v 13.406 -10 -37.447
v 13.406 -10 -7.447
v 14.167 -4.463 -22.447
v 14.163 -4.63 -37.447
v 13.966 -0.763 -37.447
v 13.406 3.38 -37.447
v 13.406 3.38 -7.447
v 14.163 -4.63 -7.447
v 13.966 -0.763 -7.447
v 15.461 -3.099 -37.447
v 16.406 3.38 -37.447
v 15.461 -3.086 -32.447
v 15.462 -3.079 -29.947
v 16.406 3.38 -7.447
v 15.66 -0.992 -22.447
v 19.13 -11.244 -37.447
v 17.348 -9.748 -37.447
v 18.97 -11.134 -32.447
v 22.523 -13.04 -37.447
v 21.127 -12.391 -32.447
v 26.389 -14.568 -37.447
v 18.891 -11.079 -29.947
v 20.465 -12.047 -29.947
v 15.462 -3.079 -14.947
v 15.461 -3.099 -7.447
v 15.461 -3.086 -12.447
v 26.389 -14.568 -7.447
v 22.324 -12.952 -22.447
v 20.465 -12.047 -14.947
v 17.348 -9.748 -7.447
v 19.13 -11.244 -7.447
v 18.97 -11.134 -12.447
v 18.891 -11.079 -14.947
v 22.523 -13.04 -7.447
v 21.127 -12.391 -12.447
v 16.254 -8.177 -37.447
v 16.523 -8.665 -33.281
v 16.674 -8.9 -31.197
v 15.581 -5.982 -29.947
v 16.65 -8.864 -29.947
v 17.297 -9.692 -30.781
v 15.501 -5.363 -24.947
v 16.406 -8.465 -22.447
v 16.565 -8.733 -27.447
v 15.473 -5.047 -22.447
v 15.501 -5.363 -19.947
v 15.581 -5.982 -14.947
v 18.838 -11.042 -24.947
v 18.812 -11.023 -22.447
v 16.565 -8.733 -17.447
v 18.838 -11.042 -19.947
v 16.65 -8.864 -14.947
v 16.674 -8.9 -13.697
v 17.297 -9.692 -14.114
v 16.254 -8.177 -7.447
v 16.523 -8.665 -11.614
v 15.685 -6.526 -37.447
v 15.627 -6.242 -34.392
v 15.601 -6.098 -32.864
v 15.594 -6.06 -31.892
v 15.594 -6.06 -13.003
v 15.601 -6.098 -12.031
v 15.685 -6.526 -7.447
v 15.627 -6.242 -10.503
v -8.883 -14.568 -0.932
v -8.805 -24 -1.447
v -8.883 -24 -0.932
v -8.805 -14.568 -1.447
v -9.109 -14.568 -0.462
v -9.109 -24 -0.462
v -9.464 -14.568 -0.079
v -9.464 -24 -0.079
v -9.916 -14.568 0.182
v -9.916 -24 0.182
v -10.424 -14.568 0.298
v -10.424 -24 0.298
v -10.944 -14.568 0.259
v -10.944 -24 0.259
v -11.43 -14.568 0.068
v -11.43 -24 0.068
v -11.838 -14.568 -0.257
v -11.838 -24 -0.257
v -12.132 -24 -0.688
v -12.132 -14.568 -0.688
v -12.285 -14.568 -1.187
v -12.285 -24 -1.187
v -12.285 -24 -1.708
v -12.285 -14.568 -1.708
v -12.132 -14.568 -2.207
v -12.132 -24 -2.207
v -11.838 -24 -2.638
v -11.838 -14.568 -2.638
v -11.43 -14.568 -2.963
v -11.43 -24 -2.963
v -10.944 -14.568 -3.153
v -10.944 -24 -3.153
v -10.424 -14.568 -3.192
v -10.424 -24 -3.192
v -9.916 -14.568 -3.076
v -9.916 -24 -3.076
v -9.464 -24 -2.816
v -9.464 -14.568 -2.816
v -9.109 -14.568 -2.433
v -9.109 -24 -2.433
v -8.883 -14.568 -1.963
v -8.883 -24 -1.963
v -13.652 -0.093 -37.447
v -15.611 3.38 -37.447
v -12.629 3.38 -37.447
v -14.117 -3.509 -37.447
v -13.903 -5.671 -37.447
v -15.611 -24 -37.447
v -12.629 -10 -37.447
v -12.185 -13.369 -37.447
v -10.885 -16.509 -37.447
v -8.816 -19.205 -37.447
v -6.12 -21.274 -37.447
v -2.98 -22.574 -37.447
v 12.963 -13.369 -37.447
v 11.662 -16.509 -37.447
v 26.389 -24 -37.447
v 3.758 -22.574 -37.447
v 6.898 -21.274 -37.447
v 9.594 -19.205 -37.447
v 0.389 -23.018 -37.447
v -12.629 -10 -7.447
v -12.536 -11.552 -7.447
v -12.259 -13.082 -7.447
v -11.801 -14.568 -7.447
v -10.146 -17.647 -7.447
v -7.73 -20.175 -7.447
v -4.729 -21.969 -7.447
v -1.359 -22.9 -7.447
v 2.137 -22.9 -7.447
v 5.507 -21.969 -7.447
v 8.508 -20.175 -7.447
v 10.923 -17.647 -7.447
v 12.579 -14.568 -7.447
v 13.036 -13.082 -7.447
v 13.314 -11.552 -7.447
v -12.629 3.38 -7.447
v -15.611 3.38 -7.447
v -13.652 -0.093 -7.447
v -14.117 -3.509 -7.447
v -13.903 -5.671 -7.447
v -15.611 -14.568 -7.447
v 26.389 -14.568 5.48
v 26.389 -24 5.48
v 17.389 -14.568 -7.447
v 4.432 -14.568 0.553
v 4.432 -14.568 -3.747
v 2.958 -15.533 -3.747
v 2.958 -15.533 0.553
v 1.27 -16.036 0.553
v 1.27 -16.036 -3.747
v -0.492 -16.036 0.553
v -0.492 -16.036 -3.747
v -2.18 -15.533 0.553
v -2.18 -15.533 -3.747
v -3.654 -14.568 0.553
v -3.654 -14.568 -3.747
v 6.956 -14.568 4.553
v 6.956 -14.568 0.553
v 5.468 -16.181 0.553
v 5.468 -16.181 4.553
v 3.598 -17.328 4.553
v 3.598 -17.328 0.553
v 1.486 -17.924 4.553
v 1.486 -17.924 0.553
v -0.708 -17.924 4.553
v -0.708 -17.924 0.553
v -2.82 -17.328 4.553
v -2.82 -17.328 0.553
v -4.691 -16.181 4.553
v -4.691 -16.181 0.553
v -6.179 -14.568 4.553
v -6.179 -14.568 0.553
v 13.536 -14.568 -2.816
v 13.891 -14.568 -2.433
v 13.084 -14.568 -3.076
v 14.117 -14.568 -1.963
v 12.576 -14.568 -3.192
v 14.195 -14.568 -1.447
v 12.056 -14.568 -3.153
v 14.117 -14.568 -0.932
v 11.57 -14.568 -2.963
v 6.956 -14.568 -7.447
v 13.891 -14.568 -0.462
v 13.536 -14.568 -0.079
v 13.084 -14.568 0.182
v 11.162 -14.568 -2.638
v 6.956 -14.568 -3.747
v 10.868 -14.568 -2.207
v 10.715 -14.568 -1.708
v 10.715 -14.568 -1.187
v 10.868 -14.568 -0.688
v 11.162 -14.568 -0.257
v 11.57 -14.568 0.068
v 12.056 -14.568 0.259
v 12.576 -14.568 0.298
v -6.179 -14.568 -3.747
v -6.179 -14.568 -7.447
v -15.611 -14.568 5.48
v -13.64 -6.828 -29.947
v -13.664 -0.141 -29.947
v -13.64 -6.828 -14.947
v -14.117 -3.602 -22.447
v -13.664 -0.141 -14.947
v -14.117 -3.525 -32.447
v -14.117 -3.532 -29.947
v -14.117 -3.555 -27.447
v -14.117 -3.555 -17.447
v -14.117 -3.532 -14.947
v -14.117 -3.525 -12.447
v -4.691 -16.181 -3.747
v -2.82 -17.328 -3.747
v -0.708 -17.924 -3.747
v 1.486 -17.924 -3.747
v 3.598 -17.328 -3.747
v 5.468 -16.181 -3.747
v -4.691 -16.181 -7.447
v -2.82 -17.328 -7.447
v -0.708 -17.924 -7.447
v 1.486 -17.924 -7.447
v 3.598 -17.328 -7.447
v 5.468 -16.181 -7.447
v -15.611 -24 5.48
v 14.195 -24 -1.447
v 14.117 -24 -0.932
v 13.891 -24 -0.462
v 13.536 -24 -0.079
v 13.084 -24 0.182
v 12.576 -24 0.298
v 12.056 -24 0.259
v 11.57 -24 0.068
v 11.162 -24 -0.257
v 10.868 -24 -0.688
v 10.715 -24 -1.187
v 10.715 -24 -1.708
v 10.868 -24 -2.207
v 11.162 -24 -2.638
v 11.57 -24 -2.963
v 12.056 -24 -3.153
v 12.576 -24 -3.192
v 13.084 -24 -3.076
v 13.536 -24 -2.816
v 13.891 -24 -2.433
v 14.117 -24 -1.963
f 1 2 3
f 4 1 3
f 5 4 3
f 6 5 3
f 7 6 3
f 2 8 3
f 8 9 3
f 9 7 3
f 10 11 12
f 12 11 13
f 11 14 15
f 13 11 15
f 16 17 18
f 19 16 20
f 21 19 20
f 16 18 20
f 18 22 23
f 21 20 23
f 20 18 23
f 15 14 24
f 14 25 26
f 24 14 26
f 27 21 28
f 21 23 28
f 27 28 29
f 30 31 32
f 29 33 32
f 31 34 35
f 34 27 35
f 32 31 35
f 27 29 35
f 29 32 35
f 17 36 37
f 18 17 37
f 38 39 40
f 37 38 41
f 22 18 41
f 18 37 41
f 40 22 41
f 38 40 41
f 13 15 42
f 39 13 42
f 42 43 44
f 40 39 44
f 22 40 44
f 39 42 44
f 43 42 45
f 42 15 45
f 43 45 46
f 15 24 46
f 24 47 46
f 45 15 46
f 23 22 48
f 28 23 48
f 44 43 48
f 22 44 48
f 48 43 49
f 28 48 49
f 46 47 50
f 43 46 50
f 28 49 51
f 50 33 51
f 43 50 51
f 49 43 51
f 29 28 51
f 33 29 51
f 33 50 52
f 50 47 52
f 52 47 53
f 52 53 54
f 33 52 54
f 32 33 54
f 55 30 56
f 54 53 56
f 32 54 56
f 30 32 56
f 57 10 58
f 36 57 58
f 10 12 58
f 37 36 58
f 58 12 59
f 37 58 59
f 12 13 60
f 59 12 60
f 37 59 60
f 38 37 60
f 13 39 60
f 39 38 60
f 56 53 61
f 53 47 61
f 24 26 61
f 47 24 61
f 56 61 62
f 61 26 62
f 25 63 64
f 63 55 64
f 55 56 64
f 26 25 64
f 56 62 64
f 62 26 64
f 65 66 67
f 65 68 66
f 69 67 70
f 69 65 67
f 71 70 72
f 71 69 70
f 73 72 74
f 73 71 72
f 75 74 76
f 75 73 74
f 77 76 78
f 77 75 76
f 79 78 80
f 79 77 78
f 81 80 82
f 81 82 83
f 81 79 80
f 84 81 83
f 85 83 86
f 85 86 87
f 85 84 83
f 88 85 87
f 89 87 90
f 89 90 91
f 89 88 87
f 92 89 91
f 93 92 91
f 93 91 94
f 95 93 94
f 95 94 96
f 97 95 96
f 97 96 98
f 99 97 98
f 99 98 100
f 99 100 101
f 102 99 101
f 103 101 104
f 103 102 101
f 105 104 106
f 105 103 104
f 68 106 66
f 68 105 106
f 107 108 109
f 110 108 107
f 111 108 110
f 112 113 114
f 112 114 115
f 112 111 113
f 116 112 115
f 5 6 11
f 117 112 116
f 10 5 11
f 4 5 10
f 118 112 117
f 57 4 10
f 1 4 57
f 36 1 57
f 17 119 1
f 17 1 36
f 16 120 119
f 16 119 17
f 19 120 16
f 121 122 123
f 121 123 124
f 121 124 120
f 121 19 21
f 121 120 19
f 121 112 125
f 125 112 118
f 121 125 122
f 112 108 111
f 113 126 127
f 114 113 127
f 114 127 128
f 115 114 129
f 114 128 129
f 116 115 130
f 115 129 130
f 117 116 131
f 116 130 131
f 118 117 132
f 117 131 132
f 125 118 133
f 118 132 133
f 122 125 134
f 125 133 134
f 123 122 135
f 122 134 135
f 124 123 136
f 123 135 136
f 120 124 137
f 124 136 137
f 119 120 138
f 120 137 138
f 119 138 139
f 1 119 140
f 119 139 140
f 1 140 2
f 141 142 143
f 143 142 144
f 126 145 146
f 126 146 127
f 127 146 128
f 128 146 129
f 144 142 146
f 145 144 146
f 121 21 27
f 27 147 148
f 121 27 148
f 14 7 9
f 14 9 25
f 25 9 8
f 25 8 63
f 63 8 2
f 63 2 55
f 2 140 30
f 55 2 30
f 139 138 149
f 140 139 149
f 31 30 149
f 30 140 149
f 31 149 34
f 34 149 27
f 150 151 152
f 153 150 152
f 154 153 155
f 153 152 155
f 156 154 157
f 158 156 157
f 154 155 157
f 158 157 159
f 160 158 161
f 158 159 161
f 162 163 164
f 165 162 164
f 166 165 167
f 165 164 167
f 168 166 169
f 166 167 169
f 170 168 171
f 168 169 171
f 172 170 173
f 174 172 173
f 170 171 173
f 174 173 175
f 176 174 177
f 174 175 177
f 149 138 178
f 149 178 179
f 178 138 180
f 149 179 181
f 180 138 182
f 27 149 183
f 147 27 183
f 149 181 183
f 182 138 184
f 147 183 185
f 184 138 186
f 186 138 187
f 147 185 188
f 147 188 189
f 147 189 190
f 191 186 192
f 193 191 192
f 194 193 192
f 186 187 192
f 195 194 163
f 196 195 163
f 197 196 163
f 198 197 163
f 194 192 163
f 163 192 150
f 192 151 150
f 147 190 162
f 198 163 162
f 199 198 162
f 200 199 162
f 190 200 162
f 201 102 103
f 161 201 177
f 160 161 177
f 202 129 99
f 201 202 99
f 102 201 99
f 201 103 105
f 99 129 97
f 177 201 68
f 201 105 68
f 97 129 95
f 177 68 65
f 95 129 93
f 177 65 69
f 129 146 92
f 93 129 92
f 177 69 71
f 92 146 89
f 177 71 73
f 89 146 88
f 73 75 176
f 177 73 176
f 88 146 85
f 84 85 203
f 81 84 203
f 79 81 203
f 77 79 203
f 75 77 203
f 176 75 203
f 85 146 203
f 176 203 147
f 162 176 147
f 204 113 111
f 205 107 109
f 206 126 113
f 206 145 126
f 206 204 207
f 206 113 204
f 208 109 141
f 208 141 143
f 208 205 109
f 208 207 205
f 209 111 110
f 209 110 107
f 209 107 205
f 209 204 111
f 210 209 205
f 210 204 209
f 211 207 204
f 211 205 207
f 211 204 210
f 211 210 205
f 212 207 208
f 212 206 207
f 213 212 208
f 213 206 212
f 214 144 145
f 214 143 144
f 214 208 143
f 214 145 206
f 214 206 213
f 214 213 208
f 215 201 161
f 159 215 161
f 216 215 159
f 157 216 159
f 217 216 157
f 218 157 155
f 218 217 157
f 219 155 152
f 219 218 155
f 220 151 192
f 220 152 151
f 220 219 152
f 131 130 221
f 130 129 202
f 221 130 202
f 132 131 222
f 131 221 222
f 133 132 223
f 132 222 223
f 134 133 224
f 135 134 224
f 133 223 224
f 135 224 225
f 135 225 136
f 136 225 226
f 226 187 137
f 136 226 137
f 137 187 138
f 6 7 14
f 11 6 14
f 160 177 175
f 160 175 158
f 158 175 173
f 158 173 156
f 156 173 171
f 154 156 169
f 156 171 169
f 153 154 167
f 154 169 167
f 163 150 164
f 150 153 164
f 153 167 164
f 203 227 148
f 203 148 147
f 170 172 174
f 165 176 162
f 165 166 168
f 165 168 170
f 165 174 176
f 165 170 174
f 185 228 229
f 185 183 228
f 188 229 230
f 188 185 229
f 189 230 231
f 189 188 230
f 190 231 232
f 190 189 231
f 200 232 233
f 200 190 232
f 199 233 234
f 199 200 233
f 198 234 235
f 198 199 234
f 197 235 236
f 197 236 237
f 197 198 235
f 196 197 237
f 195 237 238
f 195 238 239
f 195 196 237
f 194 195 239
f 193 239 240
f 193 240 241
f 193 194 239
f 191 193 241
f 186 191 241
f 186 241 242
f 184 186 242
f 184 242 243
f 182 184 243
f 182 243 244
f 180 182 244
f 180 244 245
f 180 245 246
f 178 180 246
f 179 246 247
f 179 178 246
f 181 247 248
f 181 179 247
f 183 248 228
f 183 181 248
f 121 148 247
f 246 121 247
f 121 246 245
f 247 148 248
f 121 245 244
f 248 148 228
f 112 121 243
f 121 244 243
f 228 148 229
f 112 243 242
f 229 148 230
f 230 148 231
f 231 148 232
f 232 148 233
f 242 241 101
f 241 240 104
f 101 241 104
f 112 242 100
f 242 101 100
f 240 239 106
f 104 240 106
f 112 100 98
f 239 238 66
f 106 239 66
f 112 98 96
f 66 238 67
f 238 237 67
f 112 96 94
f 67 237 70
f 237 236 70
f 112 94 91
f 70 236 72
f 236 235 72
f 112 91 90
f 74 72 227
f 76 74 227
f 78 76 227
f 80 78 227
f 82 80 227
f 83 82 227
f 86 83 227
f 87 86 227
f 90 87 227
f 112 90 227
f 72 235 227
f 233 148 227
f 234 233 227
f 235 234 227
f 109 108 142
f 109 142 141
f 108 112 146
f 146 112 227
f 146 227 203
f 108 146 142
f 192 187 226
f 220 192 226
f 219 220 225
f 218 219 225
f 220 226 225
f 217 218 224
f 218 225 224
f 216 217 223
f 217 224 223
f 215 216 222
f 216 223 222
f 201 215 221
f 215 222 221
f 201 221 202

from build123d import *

# Parameters (mm, degrees)
F0_W      = 33
F0_H      = 12.9278630987
F0_R      = 1.75
F1_DEPTH  = 20
F2_R      = 8
F3_DEPTH  = 12
F4_R      = 8
F5_DEPTH  = 8
F6_R      = 6.1
F7_DEPTH  = 8
F8_R      = 8
F9_DEPTH  = 3.7
F12_DEPTH = 25
F13_DEPTH = 4
F14_DEPTH = 9
F16_DEPTH = 30


with BuildPart() as f1:
    # F0 (on Front) → F1 (new body)
    with BuildSketch(Plane.XZ):
        with Locations((0.8888252785, -0.9834368717)):
            Rectangle(F0_W, F0_H)
        with Locations((-10.5550148675, -1.4473684211)):
            Circle(F0_R, mode=Mode.SUBTRACT)
        with Locations((12.4449851325, -1.4473684211)):
            Circle(F0_R, mode=Mode.SUBTRACT)
    extrude(amount=F1_DEPTH)

    # F2 (on face) → F3 (cut)
    with BuildSketch(Plane(origin=(0, 0, -7.4473684211), x_dir=(1, 0, 0), z_dir=(0, 0, -1))):
        with Locations((0.3888252785, 10)):
            Circle(F2_R)
    extrude(amount=-F3_DEPTH, mode=Mode.SUBTRACT)

    # F4 (on face) → F5 (join)
    with BuildSketch(Plane(origin=(0, 0, -7.4473684211), x_dir=(1, 0, 0), z_dir=(0, 0, -1))):
        with Locations((0.3888252785, 10)):
            Circle(F4_R)
    extrude(amount=-F5_DEPTH)

    # F6 (on face) → F7 (cut)
    with BuildSketch(Plane(origin=(0, 0, -7.4473684211), x_dir=(1, 0, 0), z_dir=(0, 0, -1))):
        with Locations((0.3888252785, 10)):
            Circle(F6_R)
    extrude(amount=-F7_DEPTH, mode=Mode.SUBTRACT)

    # F8 (on face) → F9 (cut)
    with BuildSketch(Plane(origin=(0, 0, -7.4473684211), x_dir=(1, 0, 0), z_dir=(0, 0, -1))):
        with Locations((0.3888252785, 10)):
            Circle(F8_R)
    extrude(amount=-F9_DEPTH, mode=Mode.SUBTRACT)

    # F11 (on face) → F12 (cut)
    with BuildSketch(Plane(origin=(0, 0, -7.4473684211), x_dir=(1, 0, 0), z_dir=(0, 0, -1))):
        Polygon((18.0706698447, 0), (18.0706698447, 14.5679928681), (-16.9293301553, 14.5679928681), (-16.9293301553, -7.1319e-06), (-16.9293301553, -2.274), (18.0706698447, -2.274), align=None)
    extrude(amount=-F12_DEPTH, mode=Mode.SUBTRACT)

    # F13 (add): a face of the model
    f13_faces = [f1.faces().sort_by_distance(p)[0] for p in [
        (0.8861725966, -20, -0.9615233022),
    ]]
    extrude(f13_faces, amount=F13_DEPTH)

    # F14 (add): a face of the model
    f14_faces = [f1.faces().sort_by_distance(p)[0] for p in [
        (17.3888252785, -19.2839964341, -0.9834368717),
    ]]
    extrude(f14_faces, amount=F14_DEPTH)

    # F15 (on face) → F16 (join)
    with BuildSketch(Plane(origin=(0, 0, -7.4473684211), x_dir=(1, 0, 0), z_dir=(0, 0, -1))):
        with BuildLine():
            ThreePointArc((-12.6287143665, 10), (0.3888252785, 23.0175396451), (13.4063649236, 10))
            add(Edge.make_bspline(
                [(13.4063649236, 10), (13.7666319519, 8.2358593285), (14.5547040376, 4.3768605613), (13.8104067985, -0.6510192147), (13.4063649236, -3.3804045524)],
                knots=[0, 0, 0, 0, 0.4571498406, 1, 1, 1, 1], degree=3))
            Line((13.4063649236, -3.3804045524), (16.4063649236, -3.3804045524))
            add(Edge.make_bspline(
                [(16.4063649236, -3.3804045524), (15.566742052, 1.0450810293), (13.8926744037, 9.8687594815), (22.2320398777, 13.0048151399), (26.3888252785, 14.5679928681)],
                knots=[0, 0, 0, 0, 0.5015465609, 1, 1, 1, 1], degree=3))
            Line((26.3888252785, 14.5679928681), (26.3888252785, 24))
            Line((26.3888252785, 24), (-15.6111747215, 24))
            Line((-15.6111747215, 24), (-15.6111747215, 14.5679928681))
            Line((-15.6111747215, 14.5679928681), (-15.6111747215, -3.3804045524))
            Line((-15.6111747215, -3.3804045524), (-12.6287143665, -3.3804045524))
            add(Edge.make_bspline(
                [(-12.6287143665, 10), (-13.3626442538, 7.8917086009), (-14.8616884424, 3.585545268), (-13.3832906948, -1.0264404402), (-12.6287143665, -3.3804045524)],
                knots=[0, 0, 0, 0, 0.4895985675, 1, 1, 1, 1], degree=3))
        make_face()
    extrude(amount=F16_DEPTH)


solid = f1.part
